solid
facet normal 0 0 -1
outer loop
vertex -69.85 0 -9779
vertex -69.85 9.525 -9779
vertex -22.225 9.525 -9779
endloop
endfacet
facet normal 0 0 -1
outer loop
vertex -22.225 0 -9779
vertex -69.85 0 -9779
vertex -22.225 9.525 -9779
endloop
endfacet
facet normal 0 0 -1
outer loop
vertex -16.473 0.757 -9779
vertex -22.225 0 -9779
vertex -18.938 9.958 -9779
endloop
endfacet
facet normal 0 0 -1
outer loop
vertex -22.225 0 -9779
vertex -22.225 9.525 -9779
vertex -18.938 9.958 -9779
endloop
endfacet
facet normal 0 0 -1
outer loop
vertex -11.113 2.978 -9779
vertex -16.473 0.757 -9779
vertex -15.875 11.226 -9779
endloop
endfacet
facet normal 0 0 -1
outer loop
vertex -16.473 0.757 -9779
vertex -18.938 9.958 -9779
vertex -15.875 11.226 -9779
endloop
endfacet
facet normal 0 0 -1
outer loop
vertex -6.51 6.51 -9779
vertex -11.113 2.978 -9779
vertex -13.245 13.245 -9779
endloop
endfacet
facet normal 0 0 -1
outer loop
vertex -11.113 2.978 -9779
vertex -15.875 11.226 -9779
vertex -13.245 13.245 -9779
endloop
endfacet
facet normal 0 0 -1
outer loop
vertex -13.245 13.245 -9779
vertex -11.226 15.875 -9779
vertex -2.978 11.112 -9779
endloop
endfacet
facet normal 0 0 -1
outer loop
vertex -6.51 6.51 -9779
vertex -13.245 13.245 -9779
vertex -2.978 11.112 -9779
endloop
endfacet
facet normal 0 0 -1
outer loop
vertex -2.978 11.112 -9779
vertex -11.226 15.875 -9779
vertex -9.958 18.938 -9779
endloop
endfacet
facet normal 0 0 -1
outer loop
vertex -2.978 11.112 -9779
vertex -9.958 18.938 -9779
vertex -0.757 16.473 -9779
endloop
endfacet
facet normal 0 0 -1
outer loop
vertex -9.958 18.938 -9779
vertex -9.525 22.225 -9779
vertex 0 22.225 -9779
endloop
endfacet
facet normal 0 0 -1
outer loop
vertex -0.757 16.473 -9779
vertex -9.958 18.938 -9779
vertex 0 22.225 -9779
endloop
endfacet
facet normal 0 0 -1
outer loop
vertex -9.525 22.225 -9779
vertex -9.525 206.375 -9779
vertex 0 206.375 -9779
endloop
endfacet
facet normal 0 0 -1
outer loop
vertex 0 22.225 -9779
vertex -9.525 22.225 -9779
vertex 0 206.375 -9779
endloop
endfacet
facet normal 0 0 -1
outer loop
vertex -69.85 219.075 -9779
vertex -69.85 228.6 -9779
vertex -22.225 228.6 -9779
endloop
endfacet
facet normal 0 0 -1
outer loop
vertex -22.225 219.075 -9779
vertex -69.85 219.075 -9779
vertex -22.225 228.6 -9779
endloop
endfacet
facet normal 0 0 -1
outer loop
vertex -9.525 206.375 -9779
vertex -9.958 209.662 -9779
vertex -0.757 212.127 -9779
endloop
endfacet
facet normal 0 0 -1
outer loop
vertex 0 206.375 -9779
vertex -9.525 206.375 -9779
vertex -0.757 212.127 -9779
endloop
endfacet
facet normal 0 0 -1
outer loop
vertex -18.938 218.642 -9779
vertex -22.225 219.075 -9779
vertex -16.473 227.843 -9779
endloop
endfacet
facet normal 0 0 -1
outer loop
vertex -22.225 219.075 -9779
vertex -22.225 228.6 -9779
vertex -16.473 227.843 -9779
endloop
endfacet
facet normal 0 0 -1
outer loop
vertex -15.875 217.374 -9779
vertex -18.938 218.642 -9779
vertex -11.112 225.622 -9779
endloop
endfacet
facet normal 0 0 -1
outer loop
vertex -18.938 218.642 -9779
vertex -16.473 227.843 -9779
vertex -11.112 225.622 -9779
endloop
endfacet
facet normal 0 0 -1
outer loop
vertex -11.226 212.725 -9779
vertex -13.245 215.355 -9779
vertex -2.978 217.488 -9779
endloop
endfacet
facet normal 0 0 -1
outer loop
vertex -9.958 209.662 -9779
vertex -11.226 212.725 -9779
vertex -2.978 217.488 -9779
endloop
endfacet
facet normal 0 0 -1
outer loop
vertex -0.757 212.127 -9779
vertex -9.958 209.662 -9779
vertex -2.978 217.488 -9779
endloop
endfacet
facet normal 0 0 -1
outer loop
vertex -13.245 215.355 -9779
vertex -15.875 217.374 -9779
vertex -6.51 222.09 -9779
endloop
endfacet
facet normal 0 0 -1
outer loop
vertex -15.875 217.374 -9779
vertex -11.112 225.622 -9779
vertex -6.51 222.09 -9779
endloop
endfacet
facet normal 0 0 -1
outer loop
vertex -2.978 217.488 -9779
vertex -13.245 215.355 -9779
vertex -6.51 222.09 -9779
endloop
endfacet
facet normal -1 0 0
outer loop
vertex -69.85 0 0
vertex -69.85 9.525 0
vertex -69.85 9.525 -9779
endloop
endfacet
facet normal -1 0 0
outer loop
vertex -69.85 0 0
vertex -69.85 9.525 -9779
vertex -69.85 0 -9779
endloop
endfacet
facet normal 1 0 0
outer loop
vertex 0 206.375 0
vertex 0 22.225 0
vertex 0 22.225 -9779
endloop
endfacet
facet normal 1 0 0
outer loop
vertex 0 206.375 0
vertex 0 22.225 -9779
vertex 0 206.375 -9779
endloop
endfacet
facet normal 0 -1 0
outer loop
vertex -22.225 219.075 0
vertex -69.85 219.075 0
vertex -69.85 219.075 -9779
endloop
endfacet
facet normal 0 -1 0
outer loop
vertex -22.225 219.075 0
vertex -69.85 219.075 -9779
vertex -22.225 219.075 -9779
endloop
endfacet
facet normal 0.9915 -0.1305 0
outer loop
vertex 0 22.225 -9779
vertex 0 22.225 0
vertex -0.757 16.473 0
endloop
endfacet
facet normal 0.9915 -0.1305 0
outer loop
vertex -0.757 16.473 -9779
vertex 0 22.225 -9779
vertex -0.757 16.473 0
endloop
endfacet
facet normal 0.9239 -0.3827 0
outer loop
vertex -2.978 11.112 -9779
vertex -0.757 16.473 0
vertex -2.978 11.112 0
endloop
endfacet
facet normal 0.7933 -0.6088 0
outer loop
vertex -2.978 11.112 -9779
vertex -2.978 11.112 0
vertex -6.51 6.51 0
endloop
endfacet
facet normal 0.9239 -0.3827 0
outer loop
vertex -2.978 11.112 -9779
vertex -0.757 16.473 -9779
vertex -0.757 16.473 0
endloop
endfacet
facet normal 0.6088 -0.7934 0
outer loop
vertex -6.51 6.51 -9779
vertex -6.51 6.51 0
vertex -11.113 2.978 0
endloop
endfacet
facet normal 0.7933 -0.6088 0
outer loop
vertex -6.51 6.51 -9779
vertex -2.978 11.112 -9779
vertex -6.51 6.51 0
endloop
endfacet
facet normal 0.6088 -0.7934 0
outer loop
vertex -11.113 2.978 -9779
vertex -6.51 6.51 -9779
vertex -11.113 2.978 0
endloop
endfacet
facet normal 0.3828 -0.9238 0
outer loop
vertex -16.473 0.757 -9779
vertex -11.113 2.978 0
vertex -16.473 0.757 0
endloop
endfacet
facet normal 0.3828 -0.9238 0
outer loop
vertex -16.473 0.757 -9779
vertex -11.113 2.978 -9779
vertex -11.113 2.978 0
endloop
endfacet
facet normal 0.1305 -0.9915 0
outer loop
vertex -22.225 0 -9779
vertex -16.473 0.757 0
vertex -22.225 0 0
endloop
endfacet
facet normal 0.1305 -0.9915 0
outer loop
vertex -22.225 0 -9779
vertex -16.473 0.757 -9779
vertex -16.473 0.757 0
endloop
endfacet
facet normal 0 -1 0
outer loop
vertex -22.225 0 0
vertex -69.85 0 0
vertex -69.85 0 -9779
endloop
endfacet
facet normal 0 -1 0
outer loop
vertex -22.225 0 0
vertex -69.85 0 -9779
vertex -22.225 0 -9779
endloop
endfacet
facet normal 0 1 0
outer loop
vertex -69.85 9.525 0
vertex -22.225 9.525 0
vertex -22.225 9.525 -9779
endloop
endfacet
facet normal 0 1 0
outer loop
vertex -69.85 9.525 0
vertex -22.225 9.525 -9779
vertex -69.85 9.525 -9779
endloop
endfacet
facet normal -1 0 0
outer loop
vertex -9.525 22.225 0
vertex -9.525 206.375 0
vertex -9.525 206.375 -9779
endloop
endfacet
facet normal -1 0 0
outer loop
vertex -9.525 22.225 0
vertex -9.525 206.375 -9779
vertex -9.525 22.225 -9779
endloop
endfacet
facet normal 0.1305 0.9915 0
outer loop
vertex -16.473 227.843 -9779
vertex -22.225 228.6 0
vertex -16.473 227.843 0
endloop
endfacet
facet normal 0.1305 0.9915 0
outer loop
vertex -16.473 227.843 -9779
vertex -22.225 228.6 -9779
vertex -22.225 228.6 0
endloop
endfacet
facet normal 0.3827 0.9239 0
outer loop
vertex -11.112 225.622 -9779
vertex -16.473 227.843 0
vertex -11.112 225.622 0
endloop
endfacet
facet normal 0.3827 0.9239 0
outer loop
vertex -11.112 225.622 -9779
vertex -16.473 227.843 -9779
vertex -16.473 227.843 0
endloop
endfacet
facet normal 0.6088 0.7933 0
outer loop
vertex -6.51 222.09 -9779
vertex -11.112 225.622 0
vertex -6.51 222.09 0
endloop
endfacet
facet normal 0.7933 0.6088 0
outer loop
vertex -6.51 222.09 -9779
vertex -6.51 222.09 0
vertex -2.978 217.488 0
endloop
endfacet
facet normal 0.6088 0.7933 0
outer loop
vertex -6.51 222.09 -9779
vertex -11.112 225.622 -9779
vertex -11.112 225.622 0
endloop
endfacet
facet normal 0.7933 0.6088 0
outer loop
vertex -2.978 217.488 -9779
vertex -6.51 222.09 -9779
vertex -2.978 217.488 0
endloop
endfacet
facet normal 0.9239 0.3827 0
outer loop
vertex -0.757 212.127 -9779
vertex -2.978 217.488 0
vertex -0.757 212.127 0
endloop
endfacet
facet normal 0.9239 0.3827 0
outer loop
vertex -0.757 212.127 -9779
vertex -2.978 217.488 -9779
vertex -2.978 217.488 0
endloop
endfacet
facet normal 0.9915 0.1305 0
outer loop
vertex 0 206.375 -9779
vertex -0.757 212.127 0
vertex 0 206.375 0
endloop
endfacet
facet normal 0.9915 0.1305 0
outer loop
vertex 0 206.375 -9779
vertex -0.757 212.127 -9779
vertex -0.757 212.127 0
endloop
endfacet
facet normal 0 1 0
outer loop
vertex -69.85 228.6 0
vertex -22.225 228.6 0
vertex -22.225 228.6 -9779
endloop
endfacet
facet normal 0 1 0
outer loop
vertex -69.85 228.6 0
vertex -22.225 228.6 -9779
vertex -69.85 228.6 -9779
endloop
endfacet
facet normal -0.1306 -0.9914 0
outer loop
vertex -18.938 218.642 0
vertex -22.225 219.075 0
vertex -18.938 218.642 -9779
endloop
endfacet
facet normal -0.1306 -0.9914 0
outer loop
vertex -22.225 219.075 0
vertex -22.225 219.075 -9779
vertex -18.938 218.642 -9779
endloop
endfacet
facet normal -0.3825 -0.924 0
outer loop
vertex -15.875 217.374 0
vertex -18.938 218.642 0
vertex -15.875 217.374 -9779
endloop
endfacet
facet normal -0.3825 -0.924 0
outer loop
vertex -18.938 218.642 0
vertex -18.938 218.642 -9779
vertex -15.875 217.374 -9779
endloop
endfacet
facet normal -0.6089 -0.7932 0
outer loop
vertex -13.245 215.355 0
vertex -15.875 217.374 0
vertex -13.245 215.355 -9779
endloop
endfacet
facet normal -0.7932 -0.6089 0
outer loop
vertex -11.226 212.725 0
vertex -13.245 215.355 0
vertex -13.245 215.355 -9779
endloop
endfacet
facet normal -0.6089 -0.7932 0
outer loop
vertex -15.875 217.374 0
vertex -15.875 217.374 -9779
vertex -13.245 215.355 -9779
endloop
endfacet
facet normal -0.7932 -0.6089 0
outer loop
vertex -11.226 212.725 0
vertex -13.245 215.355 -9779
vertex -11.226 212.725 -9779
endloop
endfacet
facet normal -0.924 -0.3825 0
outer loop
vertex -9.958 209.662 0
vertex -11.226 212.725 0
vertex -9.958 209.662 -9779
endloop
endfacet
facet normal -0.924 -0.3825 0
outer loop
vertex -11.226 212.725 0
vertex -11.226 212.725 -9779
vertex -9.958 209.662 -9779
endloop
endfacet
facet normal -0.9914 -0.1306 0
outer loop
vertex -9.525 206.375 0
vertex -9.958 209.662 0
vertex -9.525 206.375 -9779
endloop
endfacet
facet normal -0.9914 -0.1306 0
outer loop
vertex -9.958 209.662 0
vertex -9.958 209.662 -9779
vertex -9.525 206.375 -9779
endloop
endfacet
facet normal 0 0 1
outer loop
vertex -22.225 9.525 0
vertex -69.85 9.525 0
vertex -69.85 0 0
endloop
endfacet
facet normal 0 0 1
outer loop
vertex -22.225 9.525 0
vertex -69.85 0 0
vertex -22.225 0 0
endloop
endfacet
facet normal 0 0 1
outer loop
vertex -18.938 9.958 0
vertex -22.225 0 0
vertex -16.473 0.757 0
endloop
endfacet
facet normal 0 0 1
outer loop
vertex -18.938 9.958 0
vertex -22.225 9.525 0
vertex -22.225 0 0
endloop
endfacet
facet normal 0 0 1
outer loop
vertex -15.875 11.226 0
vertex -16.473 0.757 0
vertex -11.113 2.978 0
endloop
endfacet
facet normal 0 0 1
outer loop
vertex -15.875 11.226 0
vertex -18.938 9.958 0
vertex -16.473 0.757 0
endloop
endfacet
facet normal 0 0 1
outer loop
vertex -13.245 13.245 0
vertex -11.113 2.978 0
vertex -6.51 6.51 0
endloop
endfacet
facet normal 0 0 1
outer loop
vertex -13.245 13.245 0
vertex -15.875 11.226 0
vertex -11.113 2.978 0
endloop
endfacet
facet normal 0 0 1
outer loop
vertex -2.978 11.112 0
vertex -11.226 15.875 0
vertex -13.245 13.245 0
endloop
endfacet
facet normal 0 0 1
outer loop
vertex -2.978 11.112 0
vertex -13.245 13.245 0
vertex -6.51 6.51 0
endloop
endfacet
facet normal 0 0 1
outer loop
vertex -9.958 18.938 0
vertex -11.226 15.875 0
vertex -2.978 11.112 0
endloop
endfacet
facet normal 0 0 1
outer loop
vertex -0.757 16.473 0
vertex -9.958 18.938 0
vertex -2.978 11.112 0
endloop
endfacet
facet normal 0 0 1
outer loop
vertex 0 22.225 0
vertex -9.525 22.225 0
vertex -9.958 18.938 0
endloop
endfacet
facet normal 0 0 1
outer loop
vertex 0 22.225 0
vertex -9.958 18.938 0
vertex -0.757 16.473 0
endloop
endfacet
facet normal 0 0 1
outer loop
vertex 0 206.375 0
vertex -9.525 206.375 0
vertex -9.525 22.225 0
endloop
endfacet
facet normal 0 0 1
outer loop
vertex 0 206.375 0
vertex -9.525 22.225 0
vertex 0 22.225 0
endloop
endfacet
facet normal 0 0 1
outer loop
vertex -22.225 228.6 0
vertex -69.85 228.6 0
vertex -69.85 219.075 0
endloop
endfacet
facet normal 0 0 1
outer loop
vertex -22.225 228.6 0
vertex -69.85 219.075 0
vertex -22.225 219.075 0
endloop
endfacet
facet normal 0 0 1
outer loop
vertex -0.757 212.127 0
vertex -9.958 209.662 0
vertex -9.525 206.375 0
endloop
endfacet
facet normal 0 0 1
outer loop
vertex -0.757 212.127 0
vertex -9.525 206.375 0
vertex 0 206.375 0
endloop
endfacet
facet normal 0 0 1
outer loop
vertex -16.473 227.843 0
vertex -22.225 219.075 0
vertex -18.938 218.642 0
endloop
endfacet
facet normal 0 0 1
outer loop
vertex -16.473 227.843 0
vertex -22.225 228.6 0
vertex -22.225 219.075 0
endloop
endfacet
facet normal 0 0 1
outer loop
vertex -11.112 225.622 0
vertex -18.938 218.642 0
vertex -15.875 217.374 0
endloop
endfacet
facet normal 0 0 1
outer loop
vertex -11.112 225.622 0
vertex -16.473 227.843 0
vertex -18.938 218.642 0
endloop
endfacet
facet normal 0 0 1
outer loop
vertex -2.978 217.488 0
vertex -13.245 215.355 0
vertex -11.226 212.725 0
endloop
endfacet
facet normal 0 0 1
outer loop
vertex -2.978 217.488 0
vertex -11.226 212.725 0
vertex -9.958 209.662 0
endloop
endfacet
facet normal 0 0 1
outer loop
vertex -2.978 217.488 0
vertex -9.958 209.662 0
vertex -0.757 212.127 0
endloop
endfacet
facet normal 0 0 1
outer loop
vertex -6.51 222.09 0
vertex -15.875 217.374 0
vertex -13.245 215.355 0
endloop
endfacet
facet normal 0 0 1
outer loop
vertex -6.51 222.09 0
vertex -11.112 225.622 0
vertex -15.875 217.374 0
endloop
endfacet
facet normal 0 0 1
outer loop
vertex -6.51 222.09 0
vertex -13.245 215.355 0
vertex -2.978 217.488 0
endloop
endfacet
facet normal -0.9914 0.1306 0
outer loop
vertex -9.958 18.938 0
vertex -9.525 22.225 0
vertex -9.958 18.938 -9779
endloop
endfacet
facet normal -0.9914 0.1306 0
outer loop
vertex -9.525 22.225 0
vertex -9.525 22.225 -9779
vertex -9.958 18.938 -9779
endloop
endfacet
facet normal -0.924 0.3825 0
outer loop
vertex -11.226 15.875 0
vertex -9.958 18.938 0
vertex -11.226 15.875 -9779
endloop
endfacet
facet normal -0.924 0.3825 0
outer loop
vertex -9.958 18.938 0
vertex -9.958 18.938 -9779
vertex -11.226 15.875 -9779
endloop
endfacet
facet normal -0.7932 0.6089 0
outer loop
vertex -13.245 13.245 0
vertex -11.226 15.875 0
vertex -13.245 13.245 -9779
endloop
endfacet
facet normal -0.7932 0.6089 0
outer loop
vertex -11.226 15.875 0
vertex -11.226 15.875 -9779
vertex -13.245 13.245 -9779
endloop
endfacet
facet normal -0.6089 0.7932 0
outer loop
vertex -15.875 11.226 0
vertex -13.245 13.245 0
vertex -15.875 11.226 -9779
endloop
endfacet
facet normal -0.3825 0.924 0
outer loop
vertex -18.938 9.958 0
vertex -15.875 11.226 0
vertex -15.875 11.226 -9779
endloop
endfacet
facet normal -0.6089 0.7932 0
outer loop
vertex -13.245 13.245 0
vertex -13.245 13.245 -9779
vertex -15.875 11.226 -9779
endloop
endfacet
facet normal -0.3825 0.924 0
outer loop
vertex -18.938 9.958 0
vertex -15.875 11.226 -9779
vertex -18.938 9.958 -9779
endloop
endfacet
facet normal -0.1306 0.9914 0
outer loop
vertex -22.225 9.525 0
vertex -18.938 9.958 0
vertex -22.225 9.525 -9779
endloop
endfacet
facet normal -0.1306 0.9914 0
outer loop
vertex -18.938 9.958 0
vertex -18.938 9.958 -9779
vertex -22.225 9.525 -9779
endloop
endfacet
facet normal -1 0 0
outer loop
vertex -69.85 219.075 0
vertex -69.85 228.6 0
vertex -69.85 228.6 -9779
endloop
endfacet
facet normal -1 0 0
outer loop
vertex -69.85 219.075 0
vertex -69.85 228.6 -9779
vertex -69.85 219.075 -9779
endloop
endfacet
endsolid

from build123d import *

# Parameters (mm, degrees)
BASE_EXTRUDE_THIN_DEPTH = 9779
INSIDE_BEND_RADIUS_R    = 12.7
OUTSIDE_BEND_RADIUS_R   = 22.225


with BuildPart() as part:
    # Sketch1 → Base-Extrude-Thin (new body)
    with BuildSketch(Plane.XY):
        Polygon((-69.85, 0), (0, 0), (0, 228.6), (-69.85, 228.6), (-69.85, 219.075), (-9.525, 219.075), (-9.525, 9.525), (-69.85, 9.525), align=None)
    extrude(amount=-BASE_EXTRUDE_THIN_DEPTH)

    # Inside Bend Radius
    inside_bend_radius_edges = [part.edges().sort_by_distance(p)[0] for p in [
        (-9.525, 219.075, -4889.5),
        (-9.525, 9.525, -4889.5),
    ]]
    fillet(inside_bend_radius_edges, radius=INSIDE_BEND_RADIUS_R)

    # Outside Bend Radius
    outside_bend_radius_edges = [part.edges().sort_by_distance(p)[0] for p in [
        (0, 0, -4889.5),
        (0, 228.6, -4889.5),
    ]]
    fillet(outside_bend_radius_edges, radius=OUTSIDE_BEND_RADIUS_R)


solid = part.part
